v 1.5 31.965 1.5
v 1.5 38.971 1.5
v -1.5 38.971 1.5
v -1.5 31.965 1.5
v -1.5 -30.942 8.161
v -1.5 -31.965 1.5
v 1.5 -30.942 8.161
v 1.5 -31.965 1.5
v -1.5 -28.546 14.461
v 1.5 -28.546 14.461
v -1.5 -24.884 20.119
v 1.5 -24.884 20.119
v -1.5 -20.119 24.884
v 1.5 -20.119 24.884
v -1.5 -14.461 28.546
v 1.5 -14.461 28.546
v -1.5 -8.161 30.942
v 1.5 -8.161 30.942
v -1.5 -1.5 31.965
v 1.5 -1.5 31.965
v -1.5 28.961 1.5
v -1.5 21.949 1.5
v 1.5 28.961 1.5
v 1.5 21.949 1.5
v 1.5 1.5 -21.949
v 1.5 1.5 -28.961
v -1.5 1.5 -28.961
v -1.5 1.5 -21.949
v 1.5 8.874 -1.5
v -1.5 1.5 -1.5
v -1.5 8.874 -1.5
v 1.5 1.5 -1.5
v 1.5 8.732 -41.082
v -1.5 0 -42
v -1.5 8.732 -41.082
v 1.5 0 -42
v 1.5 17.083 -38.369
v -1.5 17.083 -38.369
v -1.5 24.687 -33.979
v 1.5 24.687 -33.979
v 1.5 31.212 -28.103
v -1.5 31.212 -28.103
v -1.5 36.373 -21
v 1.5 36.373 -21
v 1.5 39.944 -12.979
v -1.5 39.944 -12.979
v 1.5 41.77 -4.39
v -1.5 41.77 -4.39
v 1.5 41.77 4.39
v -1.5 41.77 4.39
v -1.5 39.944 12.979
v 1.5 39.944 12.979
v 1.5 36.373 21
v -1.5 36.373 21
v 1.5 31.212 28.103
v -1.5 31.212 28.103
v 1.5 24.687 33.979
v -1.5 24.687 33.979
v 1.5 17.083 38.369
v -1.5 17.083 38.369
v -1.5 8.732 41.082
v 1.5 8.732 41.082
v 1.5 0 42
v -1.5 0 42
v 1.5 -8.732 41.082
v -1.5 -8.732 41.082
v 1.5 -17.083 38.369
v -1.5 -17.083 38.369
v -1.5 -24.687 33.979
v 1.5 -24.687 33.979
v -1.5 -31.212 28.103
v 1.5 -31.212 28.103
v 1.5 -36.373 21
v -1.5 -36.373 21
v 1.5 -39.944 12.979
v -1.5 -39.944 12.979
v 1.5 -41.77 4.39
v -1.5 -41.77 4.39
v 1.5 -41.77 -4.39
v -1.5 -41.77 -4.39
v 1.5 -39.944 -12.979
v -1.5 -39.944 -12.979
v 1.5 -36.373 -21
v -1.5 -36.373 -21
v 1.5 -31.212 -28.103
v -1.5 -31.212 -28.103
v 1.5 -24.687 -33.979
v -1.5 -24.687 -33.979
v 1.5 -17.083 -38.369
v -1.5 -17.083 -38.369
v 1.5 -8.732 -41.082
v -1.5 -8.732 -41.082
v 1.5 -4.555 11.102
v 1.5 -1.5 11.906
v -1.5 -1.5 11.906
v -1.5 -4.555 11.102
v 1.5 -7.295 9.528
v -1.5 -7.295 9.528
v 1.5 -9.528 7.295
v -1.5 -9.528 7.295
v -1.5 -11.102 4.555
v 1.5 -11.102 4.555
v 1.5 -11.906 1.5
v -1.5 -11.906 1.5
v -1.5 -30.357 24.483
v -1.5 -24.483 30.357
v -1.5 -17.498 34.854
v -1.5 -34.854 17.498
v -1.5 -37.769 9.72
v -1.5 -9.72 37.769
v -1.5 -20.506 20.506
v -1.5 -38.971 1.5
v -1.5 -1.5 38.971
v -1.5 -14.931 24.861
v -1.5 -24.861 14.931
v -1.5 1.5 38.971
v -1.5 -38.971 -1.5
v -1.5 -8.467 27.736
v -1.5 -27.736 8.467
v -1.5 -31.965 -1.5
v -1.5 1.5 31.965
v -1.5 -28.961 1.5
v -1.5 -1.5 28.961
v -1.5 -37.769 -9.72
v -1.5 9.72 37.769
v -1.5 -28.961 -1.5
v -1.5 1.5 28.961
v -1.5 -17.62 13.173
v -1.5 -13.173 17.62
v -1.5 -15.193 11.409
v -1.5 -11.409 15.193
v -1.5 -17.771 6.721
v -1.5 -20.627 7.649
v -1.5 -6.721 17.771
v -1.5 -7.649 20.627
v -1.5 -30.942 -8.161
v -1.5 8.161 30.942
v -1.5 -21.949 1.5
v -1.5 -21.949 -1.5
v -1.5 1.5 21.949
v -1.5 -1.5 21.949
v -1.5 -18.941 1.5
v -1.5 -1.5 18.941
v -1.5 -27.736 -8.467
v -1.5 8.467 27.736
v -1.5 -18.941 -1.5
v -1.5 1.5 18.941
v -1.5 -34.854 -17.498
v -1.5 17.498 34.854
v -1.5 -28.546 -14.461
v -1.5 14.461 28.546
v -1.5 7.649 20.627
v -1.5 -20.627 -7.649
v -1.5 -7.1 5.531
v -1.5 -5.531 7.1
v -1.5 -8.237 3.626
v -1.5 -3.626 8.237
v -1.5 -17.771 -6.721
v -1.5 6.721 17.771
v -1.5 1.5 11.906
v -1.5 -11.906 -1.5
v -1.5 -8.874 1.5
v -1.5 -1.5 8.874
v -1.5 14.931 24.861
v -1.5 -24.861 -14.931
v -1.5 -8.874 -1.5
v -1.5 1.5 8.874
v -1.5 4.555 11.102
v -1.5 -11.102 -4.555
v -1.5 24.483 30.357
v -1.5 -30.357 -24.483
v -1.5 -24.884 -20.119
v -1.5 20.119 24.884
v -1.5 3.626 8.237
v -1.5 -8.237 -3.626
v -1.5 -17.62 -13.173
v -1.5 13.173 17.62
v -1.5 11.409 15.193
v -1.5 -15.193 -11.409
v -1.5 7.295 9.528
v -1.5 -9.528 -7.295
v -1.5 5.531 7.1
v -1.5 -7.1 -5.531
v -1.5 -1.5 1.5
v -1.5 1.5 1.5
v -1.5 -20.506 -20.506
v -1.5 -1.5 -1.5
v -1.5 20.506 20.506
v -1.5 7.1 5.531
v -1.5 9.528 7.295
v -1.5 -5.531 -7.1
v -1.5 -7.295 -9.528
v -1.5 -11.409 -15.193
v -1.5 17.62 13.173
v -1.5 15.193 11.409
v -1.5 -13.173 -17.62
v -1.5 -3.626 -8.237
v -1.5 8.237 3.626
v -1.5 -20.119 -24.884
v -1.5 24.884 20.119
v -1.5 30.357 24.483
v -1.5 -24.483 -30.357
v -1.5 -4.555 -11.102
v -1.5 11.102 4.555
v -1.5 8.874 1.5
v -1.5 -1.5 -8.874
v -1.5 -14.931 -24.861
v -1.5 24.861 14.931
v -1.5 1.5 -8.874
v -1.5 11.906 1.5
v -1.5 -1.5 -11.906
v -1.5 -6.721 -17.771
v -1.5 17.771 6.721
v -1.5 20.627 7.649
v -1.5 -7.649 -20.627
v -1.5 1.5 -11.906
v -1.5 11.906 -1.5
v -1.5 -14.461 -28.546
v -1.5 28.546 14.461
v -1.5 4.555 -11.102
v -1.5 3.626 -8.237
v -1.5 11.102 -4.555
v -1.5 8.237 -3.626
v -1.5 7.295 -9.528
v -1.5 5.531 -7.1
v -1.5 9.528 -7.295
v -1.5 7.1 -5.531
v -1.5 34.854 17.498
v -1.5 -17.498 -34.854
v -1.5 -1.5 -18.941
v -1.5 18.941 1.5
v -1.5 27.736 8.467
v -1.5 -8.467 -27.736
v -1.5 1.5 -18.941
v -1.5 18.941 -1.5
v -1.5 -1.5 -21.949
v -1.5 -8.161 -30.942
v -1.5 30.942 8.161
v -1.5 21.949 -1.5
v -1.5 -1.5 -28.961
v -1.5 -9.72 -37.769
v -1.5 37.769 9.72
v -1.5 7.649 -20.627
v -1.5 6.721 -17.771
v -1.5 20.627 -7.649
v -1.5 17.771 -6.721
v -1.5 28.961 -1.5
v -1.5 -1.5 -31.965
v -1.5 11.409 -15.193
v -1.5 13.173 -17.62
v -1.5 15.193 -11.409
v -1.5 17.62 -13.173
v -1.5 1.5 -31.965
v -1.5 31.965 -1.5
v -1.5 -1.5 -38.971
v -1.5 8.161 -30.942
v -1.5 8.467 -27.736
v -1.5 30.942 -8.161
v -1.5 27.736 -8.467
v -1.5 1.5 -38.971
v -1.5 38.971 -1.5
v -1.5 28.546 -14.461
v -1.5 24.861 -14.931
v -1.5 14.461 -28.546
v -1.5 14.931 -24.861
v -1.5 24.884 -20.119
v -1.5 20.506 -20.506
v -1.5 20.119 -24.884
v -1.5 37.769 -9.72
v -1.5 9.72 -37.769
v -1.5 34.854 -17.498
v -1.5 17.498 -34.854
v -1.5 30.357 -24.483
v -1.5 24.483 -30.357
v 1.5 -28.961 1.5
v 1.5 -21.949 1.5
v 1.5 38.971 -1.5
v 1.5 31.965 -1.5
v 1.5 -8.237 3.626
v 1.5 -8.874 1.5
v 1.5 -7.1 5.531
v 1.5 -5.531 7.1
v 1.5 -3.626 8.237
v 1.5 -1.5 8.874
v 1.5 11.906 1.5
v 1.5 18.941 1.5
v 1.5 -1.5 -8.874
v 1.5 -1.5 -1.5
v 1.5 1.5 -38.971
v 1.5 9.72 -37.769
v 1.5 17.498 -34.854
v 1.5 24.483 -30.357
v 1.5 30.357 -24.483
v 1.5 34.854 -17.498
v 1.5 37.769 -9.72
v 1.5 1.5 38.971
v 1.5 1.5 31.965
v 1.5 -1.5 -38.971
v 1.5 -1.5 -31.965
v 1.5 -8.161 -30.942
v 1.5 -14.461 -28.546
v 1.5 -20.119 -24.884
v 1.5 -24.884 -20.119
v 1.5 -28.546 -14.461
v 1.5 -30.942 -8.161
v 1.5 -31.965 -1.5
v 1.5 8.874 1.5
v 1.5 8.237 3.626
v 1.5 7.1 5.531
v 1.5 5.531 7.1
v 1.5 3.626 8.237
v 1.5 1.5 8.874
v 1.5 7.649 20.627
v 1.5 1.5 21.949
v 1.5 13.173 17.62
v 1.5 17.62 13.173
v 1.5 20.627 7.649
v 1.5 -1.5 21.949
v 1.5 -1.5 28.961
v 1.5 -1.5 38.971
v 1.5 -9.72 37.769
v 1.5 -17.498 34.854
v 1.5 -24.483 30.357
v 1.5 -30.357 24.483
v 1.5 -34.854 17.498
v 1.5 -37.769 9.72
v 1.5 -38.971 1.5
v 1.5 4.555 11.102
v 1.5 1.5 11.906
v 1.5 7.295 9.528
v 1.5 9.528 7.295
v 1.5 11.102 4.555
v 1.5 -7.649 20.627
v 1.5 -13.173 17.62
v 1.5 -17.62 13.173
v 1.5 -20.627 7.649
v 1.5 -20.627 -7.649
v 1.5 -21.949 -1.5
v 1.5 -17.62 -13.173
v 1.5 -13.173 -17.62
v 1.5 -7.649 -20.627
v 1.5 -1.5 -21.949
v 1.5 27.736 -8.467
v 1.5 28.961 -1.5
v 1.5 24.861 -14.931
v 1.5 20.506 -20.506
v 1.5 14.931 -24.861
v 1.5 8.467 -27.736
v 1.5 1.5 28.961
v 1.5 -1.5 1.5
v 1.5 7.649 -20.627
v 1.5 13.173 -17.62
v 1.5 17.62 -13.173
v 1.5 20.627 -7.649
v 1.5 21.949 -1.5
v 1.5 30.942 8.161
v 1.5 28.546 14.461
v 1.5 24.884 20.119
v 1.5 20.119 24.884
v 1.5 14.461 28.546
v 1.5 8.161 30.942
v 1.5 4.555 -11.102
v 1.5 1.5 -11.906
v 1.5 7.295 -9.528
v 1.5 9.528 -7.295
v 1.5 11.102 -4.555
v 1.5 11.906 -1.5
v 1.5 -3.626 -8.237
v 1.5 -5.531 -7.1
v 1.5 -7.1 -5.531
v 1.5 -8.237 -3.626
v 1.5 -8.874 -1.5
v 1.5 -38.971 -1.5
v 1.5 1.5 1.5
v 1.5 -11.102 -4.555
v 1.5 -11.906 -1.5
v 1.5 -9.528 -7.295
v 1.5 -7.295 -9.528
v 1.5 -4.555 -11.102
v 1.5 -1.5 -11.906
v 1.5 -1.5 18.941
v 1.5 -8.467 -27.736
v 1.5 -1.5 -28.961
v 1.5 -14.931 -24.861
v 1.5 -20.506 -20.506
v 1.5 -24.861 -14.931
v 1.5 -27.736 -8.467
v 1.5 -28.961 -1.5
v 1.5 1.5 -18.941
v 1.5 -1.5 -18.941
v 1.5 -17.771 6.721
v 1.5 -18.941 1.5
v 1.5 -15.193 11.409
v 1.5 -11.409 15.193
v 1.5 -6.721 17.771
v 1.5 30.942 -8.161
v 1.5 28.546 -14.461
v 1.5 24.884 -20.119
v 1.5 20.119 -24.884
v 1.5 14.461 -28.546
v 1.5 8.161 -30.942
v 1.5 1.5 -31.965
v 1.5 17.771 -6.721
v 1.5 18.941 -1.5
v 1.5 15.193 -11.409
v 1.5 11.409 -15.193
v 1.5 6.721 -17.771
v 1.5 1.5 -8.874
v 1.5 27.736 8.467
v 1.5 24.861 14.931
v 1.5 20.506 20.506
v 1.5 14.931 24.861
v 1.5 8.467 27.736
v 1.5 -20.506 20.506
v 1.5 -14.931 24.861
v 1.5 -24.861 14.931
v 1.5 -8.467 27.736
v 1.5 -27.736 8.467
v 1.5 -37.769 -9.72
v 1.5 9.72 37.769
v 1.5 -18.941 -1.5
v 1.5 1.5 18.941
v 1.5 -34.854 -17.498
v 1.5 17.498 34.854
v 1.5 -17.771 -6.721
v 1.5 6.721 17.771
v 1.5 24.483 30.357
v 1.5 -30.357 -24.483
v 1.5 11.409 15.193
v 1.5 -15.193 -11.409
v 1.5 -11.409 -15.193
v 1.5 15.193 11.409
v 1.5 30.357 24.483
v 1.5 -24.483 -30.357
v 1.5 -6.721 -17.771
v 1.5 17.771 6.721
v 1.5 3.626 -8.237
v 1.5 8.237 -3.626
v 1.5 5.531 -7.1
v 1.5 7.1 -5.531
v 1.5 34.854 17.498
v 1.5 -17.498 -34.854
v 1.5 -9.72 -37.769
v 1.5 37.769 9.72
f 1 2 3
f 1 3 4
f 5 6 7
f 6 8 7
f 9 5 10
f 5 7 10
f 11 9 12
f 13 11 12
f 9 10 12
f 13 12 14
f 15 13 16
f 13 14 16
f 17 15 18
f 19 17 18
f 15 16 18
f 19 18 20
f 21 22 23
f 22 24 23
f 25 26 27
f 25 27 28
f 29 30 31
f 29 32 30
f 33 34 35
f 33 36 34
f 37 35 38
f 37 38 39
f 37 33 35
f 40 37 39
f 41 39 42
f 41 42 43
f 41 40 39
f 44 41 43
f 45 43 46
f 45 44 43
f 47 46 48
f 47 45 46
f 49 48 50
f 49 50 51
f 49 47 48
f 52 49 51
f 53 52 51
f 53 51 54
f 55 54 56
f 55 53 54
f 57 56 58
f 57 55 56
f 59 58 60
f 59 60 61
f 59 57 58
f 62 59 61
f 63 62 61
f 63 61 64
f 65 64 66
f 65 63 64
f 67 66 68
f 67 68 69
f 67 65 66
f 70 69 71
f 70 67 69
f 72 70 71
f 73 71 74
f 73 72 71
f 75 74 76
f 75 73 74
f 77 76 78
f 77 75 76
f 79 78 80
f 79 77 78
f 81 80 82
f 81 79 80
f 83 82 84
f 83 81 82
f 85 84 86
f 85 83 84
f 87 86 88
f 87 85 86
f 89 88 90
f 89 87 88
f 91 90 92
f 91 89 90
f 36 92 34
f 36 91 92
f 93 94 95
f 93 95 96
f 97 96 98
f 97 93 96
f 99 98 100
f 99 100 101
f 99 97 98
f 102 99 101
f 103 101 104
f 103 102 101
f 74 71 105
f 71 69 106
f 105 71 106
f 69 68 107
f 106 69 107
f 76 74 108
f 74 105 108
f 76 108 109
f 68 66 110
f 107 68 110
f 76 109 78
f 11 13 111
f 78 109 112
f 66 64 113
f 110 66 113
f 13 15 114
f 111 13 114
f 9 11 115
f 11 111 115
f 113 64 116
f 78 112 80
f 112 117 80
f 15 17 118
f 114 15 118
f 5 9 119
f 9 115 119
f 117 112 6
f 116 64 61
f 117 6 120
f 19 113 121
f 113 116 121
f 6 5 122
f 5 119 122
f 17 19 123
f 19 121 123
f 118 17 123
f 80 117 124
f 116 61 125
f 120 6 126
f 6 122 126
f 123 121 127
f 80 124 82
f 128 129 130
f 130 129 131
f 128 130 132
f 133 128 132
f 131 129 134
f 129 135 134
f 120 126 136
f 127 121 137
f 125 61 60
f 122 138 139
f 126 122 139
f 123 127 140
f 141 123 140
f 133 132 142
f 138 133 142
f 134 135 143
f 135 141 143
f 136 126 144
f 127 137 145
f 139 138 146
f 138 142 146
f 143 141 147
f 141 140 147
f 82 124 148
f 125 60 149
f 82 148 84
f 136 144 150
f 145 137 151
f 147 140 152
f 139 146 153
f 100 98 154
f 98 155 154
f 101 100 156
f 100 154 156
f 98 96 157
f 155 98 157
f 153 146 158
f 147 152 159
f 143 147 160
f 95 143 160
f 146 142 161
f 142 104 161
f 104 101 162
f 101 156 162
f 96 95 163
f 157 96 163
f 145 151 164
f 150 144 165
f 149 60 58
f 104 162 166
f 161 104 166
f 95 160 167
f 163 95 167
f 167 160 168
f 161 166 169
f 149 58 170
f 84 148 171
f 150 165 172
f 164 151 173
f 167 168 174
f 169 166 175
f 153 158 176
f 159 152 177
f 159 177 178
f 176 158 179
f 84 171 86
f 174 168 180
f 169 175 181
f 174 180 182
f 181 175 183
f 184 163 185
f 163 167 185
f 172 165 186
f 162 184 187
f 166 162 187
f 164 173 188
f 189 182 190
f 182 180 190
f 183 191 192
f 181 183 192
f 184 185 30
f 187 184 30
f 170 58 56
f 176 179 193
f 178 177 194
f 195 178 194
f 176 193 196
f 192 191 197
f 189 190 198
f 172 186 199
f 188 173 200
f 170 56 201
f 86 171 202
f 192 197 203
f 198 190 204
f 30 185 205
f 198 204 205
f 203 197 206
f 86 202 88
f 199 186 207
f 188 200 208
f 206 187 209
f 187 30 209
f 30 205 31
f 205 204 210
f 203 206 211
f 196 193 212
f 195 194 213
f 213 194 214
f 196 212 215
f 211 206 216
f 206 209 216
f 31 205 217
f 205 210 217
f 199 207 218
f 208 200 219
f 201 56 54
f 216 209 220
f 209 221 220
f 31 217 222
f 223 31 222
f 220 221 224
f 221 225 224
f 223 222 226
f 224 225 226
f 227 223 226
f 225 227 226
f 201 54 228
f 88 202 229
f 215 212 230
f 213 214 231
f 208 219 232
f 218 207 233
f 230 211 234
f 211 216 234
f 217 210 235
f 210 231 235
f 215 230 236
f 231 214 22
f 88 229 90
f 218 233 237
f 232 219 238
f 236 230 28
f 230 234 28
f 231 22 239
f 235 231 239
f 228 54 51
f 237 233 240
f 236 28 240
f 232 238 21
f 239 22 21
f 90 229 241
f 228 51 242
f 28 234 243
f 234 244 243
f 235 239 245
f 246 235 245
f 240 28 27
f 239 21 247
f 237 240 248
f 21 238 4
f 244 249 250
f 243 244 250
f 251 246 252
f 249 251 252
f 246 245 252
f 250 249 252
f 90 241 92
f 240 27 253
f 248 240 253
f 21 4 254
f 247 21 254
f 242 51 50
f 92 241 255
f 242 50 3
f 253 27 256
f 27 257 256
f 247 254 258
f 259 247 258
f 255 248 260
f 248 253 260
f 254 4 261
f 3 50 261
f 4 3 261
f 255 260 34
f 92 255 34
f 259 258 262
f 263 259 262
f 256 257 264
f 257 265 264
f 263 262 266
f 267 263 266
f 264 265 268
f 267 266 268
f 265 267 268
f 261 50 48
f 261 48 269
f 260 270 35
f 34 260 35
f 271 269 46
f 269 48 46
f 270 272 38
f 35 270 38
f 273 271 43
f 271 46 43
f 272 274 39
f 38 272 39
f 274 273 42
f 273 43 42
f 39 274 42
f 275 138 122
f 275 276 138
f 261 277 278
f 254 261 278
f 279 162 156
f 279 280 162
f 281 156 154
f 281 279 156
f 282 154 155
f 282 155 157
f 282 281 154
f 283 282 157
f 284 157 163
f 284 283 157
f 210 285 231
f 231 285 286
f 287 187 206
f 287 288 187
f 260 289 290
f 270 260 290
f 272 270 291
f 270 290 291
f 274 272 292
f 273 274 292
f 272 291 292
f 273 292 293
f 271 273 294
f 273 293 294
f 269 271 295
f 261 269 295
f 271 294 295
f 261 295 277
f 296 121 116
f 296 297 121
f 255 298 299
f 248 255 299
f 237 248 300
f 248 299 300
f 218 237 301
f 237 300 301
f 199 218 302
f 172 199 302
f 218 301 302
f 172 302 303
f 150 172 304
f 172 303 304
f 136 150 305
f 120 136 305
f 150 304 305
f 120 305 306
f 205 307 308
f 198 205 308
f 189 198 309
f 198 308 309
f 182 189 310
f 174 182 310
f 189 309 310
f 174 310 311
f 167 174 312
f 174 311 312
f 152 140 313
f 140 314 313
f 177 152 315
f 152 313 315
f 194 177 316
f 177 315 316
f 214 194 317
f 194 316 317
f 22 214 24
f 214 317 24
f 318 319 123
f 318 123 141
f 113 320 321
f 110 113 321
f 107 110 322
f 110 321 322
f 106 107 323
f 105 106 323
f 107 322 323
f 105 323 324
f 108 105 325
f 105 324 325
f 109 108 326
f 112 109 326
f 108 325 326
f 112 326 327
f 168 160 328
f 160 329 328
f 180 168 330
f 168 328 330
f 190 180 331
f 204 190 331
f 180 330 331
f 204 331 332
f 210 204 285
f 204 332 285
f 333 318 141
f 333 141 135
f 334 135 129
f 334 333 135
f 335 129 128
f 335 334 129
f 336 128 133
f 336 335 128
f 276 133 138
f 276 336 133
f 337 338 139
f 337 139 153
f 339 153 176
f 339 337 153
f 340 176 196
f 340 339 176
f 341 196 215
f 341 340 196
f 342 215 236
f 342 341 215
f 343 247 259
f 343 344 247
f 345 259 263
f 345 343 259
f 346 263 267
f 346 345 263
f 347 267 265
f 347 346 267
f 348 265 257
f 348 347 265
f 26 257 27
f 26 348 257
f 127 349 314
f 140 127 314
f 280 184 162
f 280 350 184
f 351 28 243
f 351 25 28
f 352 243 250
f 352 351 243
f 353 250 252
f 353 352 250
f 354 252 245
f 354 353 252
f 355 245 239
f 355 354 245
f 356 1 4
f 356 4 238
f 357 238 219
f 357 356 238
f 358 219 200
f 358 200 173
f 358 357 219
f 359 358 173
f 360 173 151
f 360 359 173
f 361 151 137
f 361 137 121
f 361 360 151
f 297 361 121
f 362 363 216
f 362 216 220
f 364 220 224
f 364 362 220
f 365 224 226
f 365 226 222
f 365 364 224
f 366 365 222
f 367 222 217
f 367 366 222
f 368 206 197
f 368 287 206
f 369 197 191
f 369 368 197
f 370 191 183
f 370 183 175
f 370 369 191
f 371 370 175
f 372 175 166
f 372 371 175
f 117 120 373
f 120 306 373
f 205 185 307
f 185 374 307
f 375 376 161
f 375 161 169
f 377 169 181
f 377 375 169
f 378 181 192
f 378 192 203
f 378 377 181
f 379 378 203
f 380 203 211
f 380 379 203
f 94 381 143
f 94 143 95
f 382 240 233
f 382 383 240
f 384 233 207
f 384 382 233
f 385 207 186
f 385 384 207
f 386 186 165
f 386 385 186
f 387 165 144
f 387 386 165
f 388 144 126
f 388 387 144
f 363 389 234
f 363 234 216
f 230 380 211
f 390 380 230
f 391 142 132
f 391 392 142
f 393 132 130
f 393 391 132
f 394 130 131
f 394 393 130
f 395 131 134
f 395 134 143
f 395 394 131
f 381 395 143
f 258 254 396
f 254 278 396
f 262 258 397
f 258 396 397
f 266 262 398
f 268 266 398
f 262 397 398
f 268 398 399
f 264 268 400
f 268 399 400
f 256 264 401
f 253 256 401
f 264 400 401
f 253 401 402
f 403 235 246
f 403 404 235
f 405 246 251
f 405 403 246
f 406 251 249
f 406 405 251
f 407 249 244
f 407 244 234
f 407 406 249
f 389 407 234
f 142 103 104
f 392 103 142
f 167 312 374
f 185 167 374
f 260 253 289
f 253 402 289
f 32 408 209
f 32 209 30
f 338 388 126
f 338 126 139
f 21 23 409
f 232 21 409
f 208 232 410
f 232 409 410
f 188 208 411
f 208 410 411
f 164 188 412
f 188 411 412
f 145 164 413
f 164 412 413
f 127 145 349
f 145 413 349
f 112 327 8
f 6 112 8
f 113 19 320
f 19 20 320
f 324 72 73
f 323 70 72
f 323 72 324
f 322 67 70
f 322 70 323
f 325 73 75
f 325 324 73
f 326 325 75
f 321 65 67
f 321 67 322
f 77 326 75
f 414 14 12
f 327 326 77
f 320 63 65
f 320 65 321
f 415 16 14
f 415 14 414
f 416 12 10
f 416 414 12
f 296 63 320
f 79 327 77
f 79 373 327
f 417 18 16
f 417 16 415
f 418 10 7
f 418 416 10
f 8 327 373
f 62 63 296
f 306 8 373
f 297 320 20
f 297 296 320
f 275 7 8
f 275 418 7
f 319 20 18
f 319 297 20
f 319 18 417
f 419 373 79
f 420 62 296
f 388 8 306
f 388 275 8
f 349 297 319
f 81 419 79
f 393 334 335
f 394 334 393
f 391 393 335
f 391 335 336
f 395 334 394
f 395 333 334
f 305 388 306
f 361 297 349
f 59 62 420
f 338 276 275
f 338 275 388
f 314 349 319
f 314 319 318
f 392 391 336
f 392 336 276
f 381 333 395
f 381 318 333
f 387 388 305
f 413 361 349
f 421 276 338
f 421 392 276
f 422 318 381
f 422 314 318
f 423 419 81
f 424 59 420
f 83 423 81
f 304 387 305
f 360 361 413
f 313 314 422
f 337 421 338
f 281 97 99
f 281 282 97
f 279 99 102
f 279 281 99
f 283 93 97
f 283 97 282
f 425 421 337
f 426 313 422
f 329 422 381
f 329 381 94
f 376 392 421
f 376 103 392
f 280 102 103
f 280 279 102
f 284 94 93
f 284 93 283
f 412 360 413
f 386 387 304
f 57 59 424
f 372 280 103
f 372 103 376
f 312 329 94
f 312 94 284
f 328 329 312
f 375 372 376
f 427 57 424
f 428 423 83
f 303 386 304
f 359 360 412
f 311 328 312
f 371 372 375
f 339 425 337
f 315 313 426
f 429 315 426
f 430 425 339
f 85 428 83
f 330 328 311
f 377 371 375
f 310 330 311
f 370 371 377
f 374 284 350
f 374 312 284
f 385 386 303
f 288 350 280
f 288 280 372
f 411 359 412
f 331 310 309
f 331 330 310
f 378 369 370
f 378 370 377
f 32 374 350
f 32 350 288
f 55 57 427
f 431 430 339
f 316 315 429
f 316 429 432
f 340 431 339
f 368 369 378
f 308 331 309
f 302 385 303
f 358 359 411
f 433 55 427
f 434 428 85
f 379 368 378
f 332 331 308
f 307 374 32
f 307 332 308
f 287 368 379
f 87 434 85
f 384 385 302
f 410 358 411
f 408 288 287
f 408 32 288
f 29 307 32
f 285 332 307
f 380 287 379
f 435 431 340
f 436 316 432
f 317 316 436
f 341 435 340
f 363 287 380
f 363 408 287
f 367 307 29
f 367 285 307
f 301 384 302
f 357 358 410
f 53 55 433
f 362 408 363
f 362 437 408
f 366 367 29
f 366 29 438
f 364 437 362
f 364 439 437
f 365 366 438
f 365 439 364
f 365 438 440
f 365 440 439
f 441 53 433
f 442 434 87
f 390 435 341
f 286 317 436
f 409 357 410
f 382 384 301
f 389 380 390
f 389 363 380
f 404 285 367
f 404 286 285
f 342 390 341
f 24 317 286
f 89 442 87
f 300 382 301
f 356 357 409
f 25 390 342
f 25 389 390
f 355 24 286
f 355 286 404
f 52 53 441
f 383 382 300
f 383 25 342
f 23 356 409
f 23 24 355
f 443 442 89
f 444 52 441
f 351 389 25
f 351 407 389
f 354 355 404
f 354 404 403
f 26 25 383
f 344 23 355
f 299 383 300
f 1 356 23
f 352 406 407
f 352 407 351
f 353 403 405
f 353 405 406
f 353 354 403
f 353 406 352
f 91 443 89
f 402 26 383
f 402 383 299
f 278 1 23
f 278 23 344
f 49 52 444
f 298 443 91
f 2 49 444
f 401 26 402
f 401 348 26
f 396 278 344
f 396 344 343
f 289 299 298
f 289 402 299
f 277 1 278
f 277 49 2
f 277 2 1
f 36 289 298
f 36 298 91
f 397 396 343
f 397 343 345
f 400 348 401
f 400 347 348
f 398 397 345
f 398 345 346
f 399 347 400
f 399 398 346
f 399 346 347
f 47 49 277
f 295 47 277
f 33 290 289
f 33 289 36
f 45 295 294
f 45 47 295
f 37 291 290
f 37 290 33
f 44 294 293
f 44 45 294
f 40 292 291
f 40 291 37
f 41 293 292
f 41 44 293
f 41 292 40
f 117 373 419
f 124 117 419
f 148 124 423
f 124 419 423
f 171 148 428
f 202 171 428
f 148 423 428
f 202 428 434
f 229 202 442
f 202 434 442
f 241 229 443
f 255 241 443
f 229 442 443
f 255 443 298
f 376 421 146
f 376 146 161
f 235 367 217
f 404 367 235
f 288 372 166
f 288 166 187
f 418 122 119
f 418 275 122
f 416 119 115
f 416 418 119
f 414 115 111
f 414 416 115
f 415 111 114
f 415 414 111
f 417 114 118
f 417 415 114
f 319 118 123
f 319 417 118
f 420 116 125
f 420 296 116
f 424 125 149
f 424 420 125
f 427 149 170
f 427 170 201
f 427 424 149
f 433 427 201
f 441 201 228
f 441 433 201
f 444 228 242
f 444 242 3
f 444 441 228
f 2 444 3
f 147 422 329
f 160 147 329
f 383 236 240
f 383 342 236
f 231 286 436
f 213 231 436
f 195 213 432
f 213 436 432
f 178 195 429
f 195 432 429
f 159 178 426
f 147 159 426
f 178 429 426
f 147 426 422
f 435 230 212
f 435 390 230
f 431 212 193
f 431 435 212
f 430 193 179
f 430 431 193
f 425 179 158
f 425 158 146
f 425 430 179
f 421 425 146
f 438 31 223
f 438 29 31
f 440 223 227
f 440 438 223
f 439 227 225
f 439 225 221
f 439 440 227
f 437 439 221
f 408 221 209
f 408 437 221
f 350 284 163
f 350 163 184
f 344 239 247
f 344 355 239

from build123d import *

# Parameters (mm, degrees)
SKETCH1_R           = 42
BOSS_EXTRUDE1_DEPTH = 1.5


with BuildPart() as part:
    # Sketch1 → Boss-Extrude1 (new, symmetric)
    with BuildSketch(Plane(origin=(0, 0, 0), x_dir=(0, 0, -1), z_dir=(1, 0, 0))):
        Circle(SKETCH1_R)
        with BuildLine():
            Line((-1.5, 38.97114317), (-1.5, 31.964824417))
            ThreePointArc((-1.5, 31.964824417), (-22.627416998, 22.627416998), (-31.964824417, 1.5))
            Line((-31.964824417, 1.5), (-38.97114317, 1.5))
            ThreePointArc((-38.97114317, 1.5), (-27.577164466, 27.577164466), (-1.5, 38.97114317))
        make_face(mode=Mode.SUBTRACT)
        with BuildLine():
            Line((1.5, 38.97114317), (1.5, 31.964824417))
            ThreePointArc((1.5, 31.964824417), (22.627416998, 22.627416998), (31.964824417, 1.5))
            Line((31.964824417, 1.5), (38.97114317, 1.5))
            ThreePointArc((38.97114317, 1.5), (27.577164466, 27.577164466), (1.5, 38.97114317))
        make_face(mode=Mode.SUBTRACT)
        with BuildLine():
            Line((38.97114317, -1.5), (31.964824417, -1.5))
            ThreePointArc((31.964824417, -1.5), (22.627416998, -22.627416998), (1.5, -31.964824417))
            Line((1.5, -31.964824417), (1.5, -38.97114317))
            ThreePointArc((1.5, -38.97114317), (27.577164466, -27.577164466), (38.97114317, -1.5))
        make_face(mode=Mode.SUBTRACT)
        with BuildLine():
            Line((-1.5, -38.97114317), (-1.5, -31.964824417))
            ThreePointArc((-1.5, -31.964824417), (-22.627416998, -22.627416998), (-31.964824417, -1.5))
            Line((-31.964824417, -1.5), (-38.97114317, -1.5))
            ThreePointArc((-38.97114317, -1.5), (-27.577164466, -27.577164466), (-1.5, -38.97114317))
        make_face(mode=Mode.SUBTRACT)
        with BuildLine():
            Line((-28.961180915, 1.5), (-21.948804068, 1.5))
            ThreePointArc((-21.948804068, 1.5), (-15.556349186, 15.556349186), (-1.5, 21.948804068))
            Line((-1.5, 21.948804068), (-1.5, 28.961180915))
            ThreePointArc((-1.5, 28.961180915), (-20.506096654, 20.506096654), (-28.961180915, 1.5))
        make_face(mode=Mode.SUBTRACT)
        with BuildLine():
            Line((-18.940696925, 1.5), (-11.9058809, 1.5))
            ThreePointArc((-11.9058809, 1.5), (-8.485281374, 8.485281374), (-1.5, 11.9058809))
            Line((-1.5, 11.9058809), (-1.5, 18.940696925))
            ThreePointArc((-1.5, 18.940696925), (-13.435028843, 13.435028843), (-18.940696925, 1.5))
        make_face(mode=Mode.SUBTRACT)
        with BuildLine():
            Line((-8.874119675, 1.5), (-1.5, 1.5))
            Line((-1.5, 1.5), (-1.5, 8.874119675))
            ThreePointArc((-1.5, 8.874119675), (-6.363961031, 6.363961031), (-8.874119675, 1.5))
        make_face(mode=Mode.SUBTRACT)
        with BuildLine():
            Line((-28.961180915, -1.5), (-21.948804068, -1.5))
            ThreePointArc((-21.948804068, -1.5), (-15.556349186, -15.556349186), (-1.5, -21.948804068))
            Line((-1.5, -21.948804068), (-1.5, -28.961180915))
            ThreePointArc((-1.5, -28.961180915), (-20.506096654, -20.506096654), (-28.961180915, -1.5))
        make_face(mode=Mode.SUBTRACT)
        with BuildLine():
            Line((-18.940696925, -1.5), (-11.9058809, -1.5))
            ThreePointArc((-11.9058809, -1.5), (-8.485281374, -8.485281374), (-1.5, -11.9058809))
            Line((-1.5, -11.9058809), (-1.5, -18.940696925))
            ThreePointArc((-1.5, -18.940696925), (-13.435028843, -13.435028843), (-18.940696925, -1.5))
        make_face(mode=Mode.SUBTRACT)
        with BuildLine():
            Line((-8.874119675, -1.5), (-1.5, -1.5))
            Line((-1.5, -1.5), (-1.5, -8.874119675))
            ThreePointArc((-1.5, -8.874119675), (-6.363961031, -6.363961031), (-8.874119675, -1.5))
        make_face(mode=Mode.SUBTRACT)
        with BuildLine():
            Line((1.5, -28.961180915), (1.5, -21.948804068))
            ThreePointArc((1.5, -21.948804068), (15.556349186, -15.556349186), (21.948804068, -1.5))
            Line((21.948804068, -1.5), (28.961180915, -1.5))
            ThreePointArc((28.961180915, -1.5), (20.506096654, -20.506096654), (1.5, -28.961180915))
        make_face(mode=Mode.SUBTRACT)
        with BuildLine():
            Line((1.5, -18.940696925), (1.5, -11.9058809))
            ThreePointArc((1.5, -11.9058809), (8.485281374, -8.485281374), (11.9058809, -1.5))
            Line((11.9058809, -1.5), (18.940696925, -1.5))
            ThreePointArc((18.940696925, -1.5), (13.435028843, -13.435028843), (1.5, -18.940696925))
        make_face(mode=Mode.SUBTRACT)
        with BuildLine():
            Line((1.5, -8.874119675), (1.5, -1.5))
            Line((1.5, -1.5), (8.874119675, -1.5))
            ThreePointArc((8.874119675, -1.5), (6.363961031, -6.363961031), (1.5, -8.874119675))
        make_face(mode=Mode.SUBTRACT)
        with BuildLine():
            Line((8.874119675, 1.5), (1.5, 1.5))
            Line((1.5, 1.5), (1.5, 8.874119675))
            ThreePointArc((1.5, 8.874119675), (6.363961031, 6.363961031), (8.874119675, 1.5))
        make_face(mode=Mode.SUBTRACT)
        with BuildLine():
            Line((18.940696925, 1.5), (11.9058809, 1.5))
            ThreePointArc((11.9058809, 1.5), (8.485281374, 8.485281374), (1.5, 11.9058809))
            Line((1.5, 11.9058809), (1.5, 18.940696925))
            ThreePointArc((1.5, 18.940696925), (13.435028843, 13.435028843), (18.940696925, 1.5))
        make_face(mode=Mode.SUBTRACT)
        with BuildLine():
            Line((28.961180915, 1.5), (21.948804068, 1.5))
            ThreePointArc((21.948804068, 1.5), (15.556349186, 15.556349186), (1.5, 21.948804068))
            Line((1.5, 21.948804068), (1.5, 28.961180915))
            ThreePointArc((1.5, 28.961180915), (20.506096654, 20.506096654), (28.961180915, 1.5))
        make_face(mode=Mode.SUBTRACT)
    extrude(amount=BOSS_EXTRUDE1_DEPTH, both=True)


solid = part.part
